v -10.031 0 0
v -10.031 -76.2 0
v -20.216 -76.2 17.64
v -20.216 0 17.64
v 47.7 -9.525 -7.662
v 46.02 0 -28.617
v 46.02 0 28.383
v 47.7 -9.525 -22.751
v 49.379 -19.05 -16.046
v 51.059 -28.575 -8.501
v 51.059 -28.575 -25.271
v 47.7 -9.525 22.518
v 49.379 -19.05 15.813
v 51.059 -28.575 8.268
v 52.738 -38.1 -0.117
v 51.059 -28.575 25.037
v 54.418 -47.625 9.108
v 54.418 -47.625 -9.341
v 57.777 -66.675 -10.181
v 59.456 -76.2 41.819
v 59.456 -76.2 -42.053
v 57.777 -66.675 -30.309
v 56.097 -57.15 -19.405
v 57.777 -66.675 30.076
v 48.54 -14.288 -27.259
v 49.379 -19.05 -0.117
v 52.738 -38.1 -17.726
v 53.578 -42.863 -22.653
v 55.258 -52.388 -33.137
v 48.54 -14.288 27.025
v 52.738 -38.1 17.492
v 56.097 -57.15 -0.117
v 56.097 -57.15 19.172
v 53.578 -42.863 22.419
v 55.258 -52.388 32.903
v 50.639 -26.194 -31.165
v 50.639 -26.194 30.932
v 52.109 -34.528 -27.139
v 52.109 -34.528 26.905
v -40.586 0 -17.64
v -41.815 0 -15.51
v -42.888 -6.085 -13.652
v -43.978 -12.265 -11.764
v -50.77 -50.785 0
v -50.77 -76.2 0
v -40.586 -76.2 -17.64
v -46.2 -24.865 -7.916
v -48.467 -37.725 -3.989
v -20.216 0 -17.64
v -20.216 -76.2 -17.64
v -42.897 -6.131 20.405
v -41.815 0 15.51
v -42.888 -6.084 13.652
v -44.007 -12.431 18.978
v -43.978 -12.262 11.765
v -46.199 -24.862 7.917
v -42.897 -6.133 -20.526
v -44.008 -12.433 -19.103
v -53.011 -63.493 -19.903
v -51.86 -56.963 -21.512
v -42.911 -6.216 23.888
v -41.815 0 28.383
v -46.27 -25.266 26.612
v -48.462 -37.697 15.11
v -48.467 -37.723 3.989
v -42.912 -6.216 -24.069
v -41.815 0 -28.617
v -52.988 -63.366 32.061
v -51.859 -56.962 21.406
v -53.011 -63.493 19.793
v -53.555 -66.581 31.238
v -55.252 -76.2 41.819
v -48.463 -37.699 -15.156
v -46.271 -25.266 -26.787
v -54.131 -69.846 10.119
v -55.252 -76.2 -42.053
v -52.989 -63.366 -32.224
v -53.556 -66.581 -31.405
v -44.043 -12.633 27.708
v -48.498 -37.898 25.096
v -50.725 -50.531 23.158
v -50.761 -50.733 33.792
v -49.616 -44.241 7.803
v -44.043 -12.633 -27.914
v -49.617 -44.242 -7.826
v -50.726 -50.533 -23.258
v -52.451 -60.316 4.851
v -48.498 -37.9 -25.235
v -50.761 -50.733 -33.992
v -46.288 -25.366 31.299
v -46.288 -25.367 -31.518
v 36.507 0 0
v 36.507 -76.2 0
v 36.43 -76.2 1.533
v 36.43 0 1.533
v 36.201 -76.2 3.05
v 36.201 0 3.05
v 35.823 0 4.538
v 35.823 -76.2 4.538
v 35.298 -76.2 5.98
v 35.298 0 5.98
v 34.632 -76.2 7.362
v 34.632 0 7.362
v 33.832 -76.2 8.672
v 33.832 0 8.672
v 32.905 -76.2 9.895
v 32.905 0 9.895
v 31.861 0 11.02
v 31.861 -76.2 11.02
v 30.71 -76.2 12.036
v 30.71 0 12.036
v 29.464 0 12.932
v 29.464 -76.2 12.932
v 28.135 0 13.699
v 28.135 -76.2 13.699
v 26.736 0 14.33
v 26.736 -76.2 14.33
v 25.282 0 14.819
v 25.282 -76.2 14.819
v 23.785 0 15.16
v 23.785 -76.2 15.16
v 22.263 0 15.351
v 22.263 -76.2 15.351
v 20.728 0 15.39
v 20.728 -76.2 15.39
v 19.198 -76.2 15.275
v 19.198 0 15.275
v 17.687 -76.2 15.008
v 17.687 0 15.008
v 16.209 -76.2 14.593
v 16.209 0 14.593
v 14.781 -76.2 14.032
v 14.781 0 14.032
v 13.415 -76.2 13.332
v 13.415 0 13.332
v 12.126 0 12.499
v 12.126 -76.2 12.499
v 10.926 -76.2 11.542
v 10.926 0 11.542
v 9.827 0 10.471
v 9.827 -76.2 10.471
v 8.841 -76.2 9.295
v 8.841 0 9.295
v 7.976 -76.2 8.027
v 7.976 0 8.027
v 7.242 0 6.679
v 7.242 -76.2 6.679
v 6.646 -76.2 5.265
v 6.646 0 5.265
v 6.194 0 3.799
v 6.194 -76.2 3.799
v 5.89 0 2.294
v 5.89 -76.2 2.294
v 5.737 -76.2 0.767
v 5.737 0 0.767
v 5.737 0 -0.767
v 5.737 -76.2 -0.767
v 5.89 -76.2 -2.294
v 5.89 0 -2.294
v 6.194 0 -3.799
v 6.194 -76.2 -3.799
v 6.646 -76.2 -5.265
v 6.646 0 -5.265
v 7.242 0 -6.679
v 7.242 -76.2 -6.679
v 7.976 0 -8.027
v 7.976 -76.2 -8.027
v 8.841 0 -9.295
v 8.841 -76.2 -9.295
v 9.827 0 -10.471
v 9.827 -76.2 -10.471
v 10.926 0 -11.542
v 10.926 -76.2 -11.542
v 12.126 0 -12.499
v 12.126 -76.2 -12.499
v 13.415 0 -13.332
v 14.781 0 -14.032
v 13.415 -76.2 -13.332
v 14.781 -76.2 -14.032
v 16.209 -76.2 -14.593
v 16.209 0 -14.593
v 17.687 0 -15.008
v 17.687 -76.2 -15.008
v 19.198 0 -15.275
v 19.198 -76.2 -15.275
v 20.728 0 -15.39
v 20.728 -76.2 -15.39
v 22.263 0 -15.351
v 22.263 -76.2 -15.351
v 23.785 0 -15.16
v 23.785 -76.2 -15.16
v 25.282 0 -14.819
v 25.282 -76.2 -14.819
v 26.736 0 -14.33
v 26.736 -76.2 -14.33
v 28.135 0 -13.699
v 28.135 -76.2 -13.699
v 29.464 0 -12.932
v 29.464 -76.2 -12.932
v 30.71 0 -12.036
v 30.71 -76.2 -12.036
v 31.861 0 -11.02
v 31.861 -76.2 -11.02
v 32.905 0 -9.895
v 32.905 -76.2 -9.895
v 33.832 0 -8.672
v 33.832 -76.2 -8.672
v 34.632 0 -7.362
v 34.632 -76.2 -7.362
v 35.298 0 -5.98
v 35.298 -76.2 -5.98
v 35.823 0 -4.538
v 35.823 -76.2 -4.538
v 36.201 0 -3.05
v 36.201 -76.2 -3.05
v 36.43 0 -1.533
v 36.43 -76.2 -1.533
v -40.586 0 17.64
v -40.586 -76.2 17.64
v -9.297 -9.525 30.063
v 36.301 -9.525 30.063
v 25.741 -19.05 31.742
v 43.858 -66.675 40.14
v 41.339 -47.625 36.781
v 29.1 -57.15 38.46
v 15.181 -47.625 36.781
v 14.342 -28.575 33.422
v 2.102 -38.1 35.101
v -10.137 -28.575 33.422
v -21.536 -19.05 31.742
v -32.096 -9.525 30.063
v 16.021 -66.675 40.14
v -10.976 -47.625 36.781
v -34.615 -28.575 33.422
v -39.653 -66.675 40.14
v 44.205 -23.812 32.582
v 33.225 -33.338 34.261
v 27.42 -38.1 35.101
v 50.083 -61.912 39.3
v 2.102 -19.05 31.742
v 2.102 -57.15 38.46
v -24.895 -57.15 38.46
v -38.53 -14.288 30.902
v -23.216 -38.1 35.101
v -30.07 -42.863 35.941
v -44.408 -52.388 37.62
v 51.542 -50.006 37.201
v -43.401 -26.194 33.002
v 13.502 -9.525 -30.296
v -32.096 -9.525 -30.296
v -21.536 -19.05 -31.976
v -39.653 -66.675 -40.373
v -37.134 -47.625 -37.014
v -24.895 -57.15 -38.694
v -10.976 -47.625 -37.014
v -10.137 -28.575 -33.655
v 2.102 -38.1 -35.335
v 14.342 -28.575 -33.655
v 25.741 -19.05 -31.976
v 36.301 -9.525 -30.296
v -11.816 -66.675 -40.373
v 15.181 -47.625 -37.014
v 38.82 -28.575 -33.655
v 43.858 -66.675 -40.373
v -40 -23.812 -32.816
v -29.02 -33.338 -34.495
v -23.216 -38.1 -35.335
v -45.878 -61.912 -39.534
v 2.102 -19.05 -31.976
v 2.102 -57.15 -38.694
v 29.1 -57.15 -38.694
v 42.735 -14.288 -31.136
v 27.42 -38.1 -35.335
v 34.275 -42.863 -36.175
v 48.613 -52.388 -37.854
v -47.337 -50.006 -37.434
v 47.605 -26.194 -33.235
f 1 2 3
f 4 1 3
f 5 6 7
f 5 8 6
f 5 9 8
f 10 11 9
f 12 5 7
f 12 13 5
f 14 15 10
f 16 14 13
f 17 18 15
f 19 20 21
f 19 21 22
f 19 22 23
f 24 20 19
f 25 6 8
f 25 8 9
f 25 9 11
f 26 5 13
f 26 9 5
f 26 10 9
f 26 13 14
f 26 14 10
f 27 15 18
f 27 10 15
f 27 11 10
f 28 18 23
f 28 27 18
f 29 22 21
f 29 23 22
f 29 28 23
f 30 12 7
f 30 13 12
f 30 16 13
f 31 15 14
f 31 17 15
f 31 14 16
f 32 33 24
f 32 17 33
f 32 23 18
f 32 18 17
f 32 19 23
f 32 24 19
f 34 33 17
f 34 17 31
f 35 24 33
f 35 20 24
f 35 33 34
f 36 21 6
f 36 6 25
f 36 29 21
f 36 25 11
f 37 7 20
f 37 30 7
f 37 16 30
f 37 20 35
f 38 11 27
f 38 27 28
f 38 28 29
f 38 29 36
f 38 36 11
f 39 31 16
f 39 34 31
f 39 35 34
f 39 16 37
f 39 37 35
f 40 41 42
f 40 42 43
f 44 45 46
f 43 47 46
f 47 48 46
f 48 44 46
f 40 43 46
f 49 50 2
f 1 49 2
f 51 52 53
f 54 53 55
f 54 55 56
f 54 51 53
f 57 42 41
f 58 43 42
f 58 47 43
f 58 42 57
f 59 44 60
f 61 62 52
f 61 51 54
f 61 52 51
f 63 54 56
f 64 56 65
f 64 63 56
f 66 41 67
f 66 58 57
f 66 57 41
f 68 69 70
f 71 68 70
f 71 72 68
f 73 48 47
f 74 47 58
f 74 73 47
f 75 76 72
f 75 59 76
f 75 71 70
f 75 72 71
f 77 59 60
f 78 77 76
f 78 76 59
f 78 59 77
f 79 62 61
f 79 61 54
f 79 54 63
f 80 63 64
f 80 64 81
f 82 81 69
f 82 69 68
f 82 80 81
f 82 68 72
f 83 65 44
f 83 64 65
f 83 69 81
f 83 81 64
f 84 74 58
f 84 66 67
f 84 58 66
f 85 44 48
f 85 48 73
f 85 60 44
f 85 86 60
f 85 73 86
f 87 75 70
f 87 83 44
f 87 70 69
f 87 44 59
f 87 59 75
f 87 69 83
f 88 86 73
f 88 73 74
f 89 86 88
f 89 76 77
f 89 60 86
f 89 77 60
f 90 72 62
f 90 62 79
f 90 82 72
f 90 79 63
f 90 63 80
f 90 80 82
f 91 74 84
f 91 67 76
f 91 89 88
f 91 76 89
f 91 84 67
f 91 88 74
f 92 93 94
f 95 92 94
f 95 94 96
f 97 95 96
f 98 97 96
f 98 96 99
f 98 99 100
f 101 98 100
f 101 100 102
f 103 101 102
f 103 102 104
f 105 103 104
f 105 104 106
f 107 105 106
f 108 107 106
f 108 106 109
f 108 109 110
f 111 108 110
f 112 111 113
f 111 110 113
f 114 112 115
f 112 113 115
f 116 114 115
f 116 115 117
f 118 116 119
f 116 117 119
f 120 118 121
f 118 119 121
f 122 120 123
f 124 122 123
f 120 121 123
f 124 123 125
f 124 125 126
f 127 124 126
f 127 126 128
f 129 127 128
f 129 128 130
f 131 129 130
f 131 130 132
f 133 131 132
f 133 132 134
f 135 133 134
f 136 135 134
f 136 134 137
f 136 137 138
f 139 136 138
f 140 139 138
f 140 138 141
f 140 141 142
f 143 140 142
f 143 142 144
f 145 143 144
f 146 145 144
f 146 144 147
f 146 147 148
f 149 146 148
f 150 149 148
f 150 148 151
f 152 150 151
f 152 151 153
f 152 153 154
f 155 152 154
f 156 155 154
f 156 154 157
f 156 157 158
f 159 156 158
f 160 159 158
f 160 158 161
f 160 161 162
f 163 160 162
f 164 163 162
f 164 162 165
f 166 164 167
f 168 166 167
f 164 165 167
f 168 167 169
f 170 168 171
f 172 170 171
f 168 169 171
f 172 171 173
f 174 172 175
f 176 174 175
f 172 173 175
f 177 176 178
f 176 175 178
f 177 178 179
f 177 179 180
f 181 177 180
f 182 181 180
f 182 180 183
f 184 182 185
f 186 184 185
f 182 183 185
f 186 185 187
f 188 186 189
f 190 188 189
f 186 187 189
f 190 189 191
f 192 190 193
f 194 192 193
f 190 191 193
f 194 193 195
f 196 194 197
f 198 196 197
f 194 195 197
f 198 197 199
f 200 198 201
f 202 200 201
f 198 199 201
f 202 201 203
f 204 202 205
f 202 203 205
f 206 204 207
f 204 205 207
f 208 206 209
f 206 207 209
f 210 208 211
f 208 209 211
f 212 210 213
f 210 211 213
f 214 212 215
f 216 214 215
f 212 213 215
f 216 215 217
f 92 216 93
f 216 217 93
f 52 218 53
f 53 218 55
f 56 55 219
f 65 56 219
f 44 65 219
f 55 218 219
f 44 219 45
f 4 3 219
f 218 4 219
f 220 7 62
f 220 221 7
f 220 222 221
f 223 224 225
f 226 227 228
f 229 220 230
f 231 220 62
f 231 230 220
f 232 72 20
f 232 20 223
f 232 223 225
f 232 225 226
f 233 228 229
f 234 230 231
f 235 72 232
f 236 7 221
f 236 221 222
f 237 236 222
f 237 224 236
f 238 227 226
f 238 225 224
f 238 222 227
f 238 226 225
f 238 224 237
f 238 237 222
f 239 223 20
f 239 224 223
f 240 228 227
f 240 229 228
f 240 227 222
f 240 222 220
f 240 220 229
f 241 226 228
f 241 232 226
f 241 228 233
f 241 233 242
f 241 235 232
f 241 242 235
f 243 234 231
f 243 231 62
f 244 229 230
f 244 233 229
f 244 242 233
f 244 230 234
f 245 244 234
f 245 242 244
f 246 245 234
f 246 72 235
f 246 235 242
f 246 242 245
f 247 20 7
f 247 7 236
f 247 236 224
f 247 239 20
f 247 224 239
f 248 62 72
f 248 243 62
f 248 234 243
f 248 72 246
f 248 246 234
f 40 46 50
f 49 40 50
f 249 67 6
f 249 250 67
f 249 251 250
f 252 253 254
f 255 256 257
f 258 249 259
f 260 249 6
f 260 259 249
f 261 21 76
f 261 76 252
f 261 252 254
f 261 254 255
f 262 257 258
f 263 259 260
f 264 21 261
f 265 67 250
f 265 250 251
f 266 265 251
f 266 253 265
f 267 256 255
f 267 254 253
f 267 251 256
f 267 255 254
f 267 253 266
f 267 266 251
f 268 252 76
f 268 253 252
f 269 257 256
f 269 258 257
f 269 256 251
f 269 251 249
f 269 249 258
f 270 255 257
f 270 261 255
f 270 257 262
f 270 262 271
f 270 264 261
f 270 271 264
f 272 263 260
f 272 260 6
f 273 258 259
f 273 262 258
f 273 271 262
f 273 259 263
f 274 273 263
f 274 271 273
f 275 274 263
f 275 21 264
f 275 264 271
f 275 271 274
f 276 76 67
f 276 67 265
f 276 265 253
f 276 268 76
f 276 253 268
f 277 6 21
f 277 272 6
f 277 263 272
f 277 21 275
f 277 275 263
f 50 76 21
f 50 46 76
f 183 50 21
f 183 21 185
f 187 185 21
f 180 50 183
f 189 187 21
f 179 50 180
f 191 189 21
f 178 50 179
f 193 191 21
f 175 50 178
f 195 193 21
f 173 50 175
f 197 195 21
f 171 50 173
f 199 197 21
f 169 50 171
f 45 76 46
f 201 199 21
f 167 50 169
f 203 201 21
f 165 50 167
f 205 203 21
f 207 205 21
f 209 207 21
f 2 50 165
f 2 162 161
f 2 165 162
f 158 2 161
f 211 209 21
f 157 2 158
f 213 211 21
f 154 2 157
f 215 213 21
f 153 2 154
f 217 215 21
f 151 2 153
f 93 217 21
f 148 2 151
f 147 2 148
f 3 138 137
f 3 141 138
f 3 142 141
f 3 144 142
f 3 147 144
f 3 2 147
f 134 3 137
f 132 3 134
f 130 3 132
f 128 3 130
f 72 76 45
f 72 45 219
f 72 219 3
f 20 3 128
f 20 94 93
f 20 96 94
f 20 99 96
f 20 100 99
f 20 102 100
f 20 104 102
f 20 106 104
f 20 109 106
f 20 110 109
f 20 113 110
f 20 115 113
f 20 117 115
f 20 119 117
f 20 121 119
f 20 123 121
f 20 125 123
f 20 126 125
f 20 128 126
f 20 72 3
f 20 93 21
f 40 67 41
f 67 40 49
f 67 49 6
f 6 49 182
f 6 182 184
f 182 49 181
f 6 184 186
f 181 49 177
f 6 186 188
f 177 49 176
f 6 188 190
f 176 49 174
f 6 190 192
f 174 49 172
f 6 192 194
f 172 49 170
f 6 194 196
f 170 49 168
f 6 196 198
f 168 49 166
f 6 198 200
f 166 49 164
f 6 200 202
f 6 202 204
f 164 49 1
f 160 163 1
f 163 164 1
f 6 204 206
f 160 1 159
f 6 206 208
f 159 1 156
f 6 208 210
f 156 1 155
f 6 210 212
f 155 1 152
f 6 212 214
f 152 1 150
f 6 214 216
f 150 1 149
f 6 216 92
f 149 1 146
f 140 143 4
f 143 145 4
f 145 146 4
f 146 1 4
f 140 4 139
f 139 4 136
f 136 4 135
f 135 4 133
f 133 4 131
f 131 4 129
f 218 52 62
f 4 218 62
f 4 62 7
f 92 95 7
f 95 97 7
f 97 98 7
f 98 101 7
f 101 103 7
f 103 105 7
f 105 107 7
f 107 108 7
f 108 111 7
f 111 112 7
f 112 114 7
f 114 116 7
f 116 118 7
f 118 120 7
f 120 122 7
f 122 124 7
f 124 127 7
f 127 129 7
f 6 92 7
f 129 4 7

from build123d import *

# Parameters (mm, degrees)
F0_W     = 87.8357961774
F0_H     = 56.9998249412
F1_DEPTH = 76.2
F1_TAPER = -10
F2_R     = 15.3943409372
F3_DEPTH = 76.2010001


with BuildPart() as f1:
    # F0 (on Front) → F1 (new body)
    with BuildSketch(Plane.XZ):
        with Locations((2.1024532616, -0.116802752)):
            Rectangle(F0_W, F0_H)
    extrude(amount=F1_DEPTH, taper=F1_TAPER)

    # F2 (on face) → F3 (cut, through all)
    with BuildSketch(Plane.XZ.offset(76.2)):
        with Locations((21.1121719331, 0)):
            Circle(F2_R)
        Polygon((-40.5855899055, -17.6404323429), (-20.216173182, -17.6404323429), (-10.0314648202, 0), (-20.216173182, 17.6404323429), (-40.5855899055, 17.6404323429), (-50.7702982673, 0), align=None)
    extrude(amount=-F3_DEPTH, mode=Mode.SUBTRACT)


solid = f1.part
